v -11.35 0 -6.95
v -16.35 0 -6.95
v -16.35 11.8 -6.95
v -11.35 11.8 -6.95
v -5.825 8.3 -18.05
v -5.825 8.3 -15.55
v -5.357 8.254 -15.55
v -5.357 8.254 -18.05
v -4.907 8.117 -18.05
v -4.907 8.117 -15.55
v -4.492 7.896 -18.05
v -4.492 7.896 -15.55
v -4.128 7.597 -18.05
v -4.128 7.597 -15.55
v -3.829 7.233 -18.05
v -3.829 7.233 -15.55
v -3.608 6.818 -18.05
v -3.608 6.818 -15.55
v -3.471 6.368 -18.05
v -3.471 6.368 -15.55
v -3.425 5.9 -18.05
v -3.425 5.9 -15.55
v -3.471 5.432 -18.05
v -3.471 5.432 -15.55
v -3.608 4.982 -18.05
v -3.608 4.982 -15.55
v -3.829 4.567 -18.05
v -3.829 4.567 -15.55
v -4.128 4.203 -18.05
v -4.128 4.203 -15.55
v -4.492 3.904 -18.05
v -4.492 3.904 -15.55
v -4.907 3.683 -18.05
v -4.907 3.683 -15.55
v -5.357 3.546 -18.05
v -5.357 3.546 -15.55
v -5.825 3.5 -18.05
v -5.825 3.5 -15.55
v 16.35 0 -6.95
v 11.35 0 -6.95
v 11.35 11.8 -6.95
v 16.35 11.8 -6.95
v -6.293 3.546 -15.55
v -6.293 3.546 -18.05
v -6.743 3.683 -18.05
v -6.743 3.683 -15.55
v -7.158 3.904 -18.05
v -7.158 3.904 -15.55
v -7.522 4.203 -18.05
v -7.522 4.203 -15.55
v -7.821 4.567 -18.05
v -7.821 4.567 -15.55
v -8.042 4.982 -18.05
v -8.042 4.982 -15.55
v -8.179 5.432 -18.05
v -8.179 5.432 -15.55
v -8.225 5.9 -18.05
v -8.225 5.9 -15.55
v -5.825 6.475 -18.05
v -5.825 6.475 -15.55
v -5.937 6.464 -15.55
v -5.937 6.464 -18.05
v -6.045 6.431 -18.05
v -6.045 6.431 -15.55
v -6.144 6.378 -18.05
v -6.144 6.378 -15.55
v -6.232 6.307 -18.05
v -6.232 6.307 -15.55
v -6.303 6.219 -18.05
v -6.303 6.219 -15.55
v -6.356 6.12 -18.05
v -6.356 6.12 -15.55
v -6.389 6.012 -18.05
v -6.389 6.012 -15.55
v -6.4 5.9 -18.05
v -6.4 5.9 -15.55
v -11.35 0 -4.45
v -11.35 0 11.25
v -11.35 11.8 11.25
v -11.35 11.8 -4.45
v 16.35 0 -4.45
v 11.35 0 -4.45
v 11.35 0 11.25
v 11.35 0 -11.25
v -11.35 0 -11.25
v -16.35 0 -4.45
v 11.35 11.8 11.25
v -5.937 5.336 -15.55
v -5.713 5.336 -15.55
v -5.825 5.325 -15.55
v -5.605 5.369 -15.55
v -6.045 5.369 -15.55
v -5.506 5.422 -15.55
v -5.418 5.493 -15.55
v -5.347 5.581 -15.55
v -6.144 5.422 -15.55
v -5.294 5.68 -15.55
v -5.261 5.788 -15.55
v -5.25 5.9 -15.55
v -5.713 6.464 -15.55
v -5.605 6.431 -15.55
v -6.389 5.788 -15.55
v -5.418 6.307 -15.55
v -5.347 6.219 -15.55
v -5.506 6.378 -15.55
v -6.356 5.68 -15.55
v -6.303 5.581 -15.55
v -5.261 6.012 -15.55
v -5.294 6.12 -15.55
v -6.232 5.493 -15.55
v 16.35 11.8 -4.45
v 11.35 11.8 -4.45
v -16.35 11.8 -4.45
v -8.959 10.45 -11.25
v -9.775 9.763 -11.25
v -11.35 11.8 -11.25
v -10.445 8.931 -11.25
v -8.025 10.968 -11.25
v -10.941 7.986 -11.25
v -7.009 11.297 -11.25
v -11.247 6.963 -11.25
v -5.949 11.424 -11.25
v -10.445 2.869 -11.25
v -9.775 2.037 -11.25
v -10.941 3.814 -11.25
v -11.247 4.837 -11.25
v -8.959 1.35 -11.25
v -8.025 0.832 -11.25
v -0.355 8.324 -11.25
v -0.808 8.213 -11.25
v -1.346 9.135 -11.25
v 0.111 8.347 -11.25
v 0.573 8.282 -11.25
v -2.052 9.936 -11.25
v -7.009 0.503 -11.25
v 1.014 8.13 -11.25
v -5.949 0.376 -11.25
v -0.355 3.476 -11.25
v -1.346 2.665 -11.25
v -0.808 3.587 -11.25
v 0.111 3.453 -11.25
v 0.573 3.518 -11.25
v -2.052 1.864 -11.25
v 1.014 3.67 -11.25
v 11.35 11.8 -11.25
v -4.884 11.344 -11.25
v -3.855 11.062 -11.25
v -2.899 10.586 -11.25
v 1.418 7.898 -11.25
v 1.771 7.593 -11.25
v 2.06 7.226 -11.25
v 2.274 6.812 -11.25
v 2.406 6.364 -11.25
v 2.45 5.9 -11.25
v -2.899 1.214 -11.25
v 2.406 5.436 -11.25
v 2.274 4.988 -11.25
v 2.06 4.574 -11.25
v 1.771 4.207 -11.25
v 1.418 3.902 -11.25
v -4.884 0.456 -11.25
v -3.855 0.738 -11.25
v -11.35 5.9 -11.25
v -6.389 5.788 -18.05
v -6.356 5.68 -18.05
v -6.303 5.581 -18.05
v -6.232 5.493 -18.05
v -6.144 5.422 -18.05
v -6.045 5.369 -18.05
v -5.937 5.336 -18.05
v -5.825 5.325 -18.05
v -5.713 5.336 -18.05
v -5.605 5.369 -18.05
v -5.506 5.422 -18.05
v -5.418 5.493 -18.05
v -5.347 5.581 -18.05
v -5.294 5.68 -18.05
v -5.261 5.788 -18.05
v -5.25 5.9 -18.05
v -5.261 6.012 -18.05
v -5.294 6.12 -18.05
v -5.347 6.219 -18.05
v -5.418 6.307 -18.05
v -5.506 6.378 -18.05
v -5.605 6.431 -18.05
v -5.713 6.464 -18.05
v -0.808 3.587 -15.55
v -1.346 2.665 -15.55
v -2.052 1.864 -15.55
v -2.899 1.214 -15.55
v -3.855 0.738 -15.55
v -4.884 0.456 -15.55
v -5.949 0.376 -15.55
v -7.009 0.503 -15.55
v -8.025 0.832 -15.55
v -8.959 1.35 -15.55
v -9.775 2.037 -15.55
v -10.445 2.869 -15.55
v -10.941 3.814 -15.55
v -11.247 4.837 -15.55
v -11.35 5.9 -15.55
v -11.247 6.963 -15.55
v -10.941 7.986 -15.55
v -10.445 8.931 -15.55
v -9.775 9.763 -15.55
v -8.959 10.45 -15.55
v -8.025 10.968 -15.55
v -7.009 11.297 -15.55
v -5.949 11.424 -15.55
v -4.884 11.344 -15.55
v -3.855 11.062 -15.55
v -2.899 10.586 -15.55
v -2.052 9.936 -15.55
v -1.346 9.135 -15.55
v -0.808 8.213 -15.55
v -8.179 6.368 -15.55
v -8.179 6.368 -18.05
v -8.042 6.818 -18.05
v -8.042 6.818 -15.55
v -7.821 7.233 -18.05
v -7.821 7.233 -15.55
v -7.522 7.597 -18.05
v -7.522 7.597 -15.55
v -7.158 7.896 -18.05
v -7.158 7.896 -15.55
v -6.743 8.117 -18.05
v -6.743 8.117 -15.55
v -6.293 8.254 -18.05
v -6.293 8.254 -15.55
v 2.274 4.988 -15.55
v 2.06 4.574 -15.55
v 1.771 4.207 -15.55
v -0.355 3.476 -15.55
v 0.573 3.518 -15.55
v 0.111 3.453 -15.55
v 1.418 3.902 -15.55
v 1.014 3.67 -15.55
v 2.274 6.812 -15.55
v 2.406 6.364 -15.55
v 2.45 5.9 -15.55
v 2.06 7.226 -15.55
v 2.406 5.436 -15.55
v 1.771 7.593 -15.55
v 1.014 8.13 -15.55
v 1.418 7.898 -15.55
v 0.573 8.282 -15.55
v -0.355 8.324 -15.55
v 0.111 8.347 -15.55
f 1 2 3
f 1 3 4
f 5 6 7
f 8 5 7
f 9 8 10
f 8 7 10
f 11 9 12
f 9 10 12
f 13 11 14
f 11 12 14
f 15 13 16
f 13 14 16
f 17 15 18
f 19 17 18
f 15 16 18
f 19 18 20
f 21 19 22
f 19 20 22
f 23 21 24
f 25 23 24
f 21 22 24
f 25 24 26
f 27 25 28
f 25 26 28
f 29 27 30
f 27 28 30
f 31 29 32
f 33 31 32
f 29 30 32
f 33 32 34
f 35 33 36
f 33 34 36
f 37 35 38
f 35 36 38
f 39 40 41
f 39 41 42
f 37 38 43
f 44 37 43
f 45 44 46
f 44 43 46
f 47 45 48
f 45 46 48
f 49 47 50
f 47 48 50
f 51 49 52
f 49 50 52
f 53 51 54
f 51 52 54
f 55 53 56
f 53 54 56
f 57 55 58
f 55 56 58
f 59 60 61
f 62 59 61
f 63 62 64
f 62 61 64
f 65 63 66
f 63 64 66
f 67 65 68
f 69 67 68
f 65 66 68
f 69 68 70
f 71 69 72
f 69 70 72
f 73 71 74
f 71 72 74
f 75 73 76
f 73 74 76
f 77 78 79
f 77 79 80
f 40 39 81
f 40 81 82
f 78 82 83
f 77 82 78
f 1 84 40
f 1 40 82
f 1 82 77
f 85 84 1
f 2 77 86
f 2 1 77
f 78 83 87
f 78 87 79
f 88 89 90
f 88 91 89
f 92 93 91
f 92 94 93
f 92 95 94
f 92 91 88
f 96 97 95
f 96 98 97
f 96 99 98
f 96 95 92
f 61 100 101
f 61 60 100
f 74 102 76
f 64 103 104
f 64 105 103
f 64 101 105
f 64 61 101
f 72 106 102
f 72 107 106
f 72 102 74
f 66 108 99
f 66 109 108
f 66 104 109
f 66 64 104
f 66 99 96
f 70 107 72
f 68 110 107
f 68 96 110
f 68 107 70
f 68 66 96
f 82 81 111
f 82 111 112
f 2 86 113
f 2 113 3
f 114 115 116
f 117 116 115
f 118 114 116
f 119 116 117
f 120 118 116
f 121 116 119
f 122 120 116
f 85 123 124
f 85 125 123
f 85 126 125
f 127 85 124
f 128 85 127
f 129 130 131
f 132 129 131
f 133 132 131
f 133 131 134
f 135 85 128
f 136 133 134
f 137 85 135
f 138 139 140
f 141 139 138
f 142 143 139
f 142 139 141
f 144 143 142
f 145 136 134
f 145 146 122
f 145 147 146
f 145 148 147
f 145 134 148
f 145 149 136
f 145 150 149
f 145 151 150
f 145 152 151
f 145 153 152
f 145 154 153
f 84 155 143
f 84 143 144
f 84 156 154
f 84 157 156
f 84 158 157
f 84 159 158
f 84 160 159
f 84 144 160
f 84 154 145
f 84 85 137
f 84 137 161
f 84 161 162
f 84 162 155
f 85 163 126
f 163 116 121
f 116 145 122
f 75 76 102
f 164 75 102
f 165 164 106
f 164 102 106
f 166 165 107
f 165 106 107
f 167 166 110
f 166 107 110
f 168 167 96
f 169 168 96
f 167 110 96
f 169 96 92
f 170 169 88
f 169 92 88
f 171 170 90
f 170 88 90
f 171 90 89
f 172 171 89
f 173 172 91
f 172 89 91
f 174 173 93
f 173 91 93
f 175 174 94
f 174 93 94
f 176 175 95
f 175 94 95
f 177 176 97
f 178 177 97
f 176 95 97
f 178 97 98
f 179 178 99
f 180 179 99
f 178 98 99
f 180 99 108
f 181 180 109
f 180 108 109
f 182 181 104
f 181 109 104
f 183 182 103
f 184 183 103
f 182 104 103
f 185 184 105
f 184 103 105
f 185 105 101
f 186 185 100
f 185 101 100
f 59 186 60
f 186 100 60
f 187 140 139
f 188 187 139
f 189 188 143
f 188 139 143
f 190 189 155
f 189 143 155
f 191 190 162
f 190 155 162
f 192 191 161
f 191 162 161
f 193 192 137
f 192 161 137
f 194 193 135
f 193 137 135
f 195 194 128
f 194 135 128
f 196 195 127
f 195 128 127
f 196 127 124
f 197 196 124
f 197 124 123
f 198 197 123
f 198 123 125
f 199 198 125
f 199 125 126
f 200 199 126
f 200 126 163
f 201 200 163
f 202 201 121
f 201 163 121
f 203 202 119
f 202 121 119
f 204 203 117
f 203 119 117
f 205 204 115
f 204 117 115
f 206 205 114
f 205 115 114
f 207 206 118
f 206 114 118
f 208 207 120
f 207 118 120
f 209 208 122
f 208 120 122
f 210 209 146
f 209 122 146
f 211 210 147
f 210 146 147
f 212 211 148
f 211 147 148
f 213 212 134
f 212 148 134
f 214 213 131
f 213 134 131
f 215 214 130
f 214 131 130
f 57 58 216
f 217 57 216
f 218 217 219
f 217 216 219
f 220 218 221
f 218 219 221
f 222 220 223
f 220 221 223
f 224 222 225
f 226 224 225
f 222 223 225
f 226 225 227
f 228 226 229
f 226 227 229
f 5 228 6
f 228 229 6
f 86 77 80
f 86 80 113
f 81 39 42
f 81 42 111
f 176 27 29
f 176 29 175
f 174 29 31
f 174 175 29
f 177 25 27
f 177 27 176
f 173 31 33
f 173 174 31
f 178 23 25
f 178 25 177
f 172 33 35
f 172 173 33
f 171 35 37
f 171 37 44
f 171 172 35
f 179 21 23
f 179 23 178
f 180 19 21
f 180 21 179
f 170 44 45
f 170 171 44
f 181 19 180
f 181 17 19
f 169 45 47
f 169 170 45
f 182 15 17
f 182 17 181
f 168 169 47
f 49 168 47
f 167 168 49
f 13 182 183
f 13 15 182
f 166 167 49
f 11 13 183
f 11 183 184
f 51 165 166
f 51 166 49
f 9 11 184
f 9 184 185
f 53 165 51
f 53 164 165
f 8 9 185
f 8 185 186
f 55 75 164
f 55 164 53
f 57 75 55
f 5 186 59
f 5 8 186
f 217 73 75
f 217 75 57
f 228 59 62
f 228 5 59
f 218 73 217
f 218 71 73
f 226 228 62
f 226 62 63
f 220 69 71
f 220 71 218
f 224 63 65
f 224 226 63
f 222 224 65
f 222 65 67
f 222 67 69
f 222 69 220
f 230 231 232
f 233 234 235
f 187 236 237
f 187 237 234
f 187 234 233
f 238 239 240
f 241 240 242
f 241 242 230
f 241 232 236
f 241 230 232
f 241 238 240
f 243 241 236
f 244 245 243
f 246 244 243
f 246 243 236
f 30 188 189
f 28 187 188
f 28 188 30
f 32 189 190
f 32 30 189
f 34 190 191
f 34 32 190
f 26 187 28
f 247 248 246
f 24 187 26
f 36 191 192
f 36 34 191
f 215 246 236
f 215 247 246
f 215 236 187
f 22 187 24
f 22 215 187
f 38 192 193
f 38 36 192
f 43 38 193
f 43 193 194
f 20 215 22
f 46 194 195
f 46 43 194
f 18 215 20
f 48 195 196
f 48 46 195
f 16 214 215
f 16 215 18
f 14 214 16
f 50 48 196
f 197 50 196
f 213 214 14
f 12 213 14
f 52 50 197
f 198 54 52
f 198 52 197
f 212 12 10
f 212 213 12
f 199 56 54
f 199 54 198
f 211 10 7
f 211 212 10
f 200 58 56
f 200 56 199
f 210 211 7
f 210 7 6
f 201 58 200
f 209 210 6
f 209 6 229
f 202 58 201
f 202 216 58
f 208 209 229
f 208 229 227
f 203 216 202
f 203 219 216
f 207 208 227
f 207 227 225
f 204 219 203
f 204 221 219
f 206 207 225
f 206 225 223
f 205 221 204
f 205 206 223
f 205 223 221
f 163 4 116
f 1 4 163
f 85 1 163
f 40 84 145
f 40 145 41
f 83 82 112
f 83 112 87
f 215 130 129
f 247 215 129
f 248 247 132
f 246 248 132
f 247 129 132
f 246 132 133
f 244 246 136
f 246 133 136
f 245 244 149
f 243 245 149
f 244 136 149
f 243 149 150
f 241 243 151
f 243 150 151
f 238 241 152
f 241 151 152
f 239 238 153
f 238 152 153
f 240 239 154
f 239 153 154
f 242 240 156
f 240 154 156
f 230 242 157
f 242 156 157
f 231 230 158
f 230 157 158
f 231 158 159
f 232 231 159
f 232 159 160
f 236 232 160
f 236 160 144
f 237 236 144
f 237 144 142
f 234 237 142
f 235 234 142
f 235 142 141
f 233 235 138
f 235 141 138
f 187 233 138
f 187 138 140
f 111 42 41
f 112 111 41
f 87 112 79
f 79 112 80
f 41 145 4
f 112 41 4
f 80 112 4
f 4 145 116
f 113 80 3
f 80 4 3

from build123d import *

# Parameters (mm, degrees)
SALIENTE_EXTRUIR1_DEPTH = 11.8
CROQUIS7_R              = 5.525
CROQUIS7_R_2            = 2.45
SALIENTE_EXTRUIR2_DEPTH = 4.3
SALIENTE_EXTRUIR4_DEPTH = 2.5


with BuildPart() as part:
    # Croquis3 → Saliente-Extruir1 (new body)
    with BuildSketch(Plane(origin=(0, 0, 0), x_dir=(1, 0, 0), z_dir=(0, 1, 0))):
        Polygon((-11.35, 11.25), (11.35, 11.25), (11.35, 6.95), (16.35, 6.95), (16.35, 4.45), (11.35, 4.45), (11.35, -11.25), (-11.35, -11.25), (-11.35, 4.45), (-16.35, 4.45), (-16.35, 6.95), (-11.35, 6.95), align=None)
    extrude(amount=SALIENTE_EXTRUIR1_DEPTH)

    # Croquis7 → Saliente-Extruir2 (add)
    with BuildSketch(Plane(origin=(0, 0, -11.25), x_dir=(-1, 0, 0), z_dir=(0, 0, -1))):
        with Locations((5.825, 5.9)):
            Circle(CROQUIS7_R)
        with Locations((0, 5.9)):
            Circle(CROQUIS7_R_2)
    extrude(amount=SALIENTE_EXTRUIR2_DEPTH)

    # Croquis8 → Saliente-Extruir4 (add)
    with BuildSketch(Plane(origin=(0, 0, -15.55), x_dir=(-1, 0, 0), z_dir=(0, 0, -1))):
        with BuildLine():
            ThreePointArc((8.225, 5.9), (7.522056275, 7.597056275), (5.825, 8.3))
            Line((5.825, 8.3), (5.825, 6.475))
            ThreePointArc((5.825, 6.475), (6.231586399, 6.306586399), (6.4, 5.9))
            ThreePointArc((6.4, 5.9), (6.231586399, 5.493413601), (5.825, 5.325))
            Line((5.825, 5.325), (5.825, 3.5))
            ThreePointArc((5.825, 3.5), (7.522056275, 4.202943725), (8.225, 5.9))
        make_face()
        with BuildLine():
            Line((5.825, 6.475), (5.825, 8.3))
            ThreePointArc((5.825, 8.3), (3.425, 5.9), (5.825, 3.5))
            Line((5.825, 3.5), (5.825, 5.325))
            ThreePointArc((5.825, 5.325), (5.25, 5.9), (5.825, 6.475))
        make_face()
    extrude(amount=SALIENTE_EXTRUIR4_DEPTH)


solid = part.part
